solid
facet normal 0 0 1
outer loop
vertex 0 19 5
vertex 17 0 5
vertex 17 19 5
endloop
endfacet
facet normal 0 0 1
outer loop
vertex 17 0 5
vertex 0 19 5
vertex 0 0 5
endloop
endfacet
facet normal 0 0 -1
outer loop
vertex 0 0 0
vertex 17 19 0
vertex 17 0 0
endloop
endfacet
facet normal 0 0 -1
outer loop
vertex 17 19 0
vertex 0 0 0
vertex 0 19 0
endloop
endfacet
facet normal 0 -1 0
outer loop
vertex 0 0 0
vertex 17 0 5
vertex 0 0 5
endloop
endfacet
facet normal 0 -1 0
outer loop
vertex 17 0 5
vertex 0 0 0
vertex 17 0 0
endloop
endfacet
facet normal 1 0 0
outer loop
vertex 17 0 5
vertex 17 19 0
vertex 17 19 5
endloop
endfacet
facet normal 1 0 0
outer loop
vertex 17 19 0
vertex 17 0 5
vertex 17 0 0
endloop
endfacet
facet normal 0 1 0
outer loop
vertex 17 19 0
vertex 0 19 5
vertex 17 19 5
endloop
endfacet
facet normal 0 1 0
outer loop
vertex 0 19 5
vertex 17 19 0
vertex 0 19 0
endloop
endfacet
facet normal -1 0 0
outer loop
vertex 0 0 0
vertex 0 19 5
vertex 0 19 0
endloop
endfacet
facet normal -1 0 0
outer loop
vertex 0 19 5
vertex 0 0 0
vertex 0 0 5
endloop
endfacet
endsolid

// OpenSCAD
// Generated by SolidPython 1.0.1 on 2020-07-29 00:46:56


cube(size = [17, 19, 5]);
/***********************************************
*********      SolidPython code:      **********
************************************************
 
# import packages: SolidPython
from solid import *
from solid.utils import *
from itertools import chain, combinations, permutations


class Resize:

    def __init__(self, scad_file):
        self.scad_file = scad_file
        #self.scad_file = import_scad(scad_file)
        # cone/cylinder param:
        self.r1 = 0
        self.r2 = 0
        self.h = 0
        # rectangular prism param:
        self.w = 0
        self.l = 0
        # ellipse param:
        self.r = 0

    # import OpenScad code (file name corresponds to shape)


    # classify shape + parameters
    def assign(self, param1, param2, param3):
        if self.scad_file == 'cone.scad':
            self.r1 = param1
            self.r2 = param2
            self.h = param3
        elif self.scad_file == 'cylinder.scad':
            self.r1 = param1
            self.r2 = param2
            self.h = param3
        elif self.scad_file == 'rectangularPrism.scad':
            self.h = param1
            self.l = param2
            self.w = param3
        else:
            self.r = param1
            self.h = param2

    # resize parameters
    def iterate(self):
        x = range(3, 20, 2)
        i = 1
        if self.scad_file == 'cone.scad':
            tempList = list(permutations(x, 2))
            for temp in tempList:
                param1 = temp[0]
                param2 = temp[1]
                filepath = 'produced_scad_files/' + 'cone' + str(param1) + '_' + str(param2) + '_' + '.scad'
                scad_render_to_file(cylinder(h=param1, r1=param2, r2=0), filepath)

        elif self.scad_file == 'cylinder.scad':
            tempList = list(permutations(x, 3))
            for temp in tempList:
                param1 = temp[0]
                param2 = temp[1]
                filepath = 'produced_scad_files/' + 'cylinder' + str(param1) + '_' + str(param2) + '_' + '.scad'
                scad_render_to_file(cylinder(h=param1, r1=param2, r2=param2), filepath)

        elif self.scad_file == 'rectangularPrism.scad':
            tempList = list(permutations(x, 3))
            for temp in tempList:
                param1 = temp[0]
                param2 = temp[1]
                param3 = temp[2]
                filepath = 'produced_scad_files/' + 'rectangularPrism' + str(param1) + '_' + str(param2) + '_' + str(
                    param3) + '.scad'
                scad_render_to_file(cube(size=(param1, param2, param3)), filepath)

        elif self.scad_file == 'ellipse.scad':
            tempList = list(permutations(x, 4))
            for temp in tempList:
                param1 = temp[0]
                param2 = temp[1]
                param3 = temp[2]
                param4 = temp[3]
                filepath = 'produced_scad_files/' + 'ellipse' + str(param1) + '_' + str(param2) + '_' + str(param3) + '_' + str(param4) + '.scad'
                scad_render_to_file(scale([param1, param2, param3])(sphere(r=param4)), filepath)

    def render_to_scadfile(self):
        scad_render_to_file(scad, 'example.scad') 
 
************************************************/
